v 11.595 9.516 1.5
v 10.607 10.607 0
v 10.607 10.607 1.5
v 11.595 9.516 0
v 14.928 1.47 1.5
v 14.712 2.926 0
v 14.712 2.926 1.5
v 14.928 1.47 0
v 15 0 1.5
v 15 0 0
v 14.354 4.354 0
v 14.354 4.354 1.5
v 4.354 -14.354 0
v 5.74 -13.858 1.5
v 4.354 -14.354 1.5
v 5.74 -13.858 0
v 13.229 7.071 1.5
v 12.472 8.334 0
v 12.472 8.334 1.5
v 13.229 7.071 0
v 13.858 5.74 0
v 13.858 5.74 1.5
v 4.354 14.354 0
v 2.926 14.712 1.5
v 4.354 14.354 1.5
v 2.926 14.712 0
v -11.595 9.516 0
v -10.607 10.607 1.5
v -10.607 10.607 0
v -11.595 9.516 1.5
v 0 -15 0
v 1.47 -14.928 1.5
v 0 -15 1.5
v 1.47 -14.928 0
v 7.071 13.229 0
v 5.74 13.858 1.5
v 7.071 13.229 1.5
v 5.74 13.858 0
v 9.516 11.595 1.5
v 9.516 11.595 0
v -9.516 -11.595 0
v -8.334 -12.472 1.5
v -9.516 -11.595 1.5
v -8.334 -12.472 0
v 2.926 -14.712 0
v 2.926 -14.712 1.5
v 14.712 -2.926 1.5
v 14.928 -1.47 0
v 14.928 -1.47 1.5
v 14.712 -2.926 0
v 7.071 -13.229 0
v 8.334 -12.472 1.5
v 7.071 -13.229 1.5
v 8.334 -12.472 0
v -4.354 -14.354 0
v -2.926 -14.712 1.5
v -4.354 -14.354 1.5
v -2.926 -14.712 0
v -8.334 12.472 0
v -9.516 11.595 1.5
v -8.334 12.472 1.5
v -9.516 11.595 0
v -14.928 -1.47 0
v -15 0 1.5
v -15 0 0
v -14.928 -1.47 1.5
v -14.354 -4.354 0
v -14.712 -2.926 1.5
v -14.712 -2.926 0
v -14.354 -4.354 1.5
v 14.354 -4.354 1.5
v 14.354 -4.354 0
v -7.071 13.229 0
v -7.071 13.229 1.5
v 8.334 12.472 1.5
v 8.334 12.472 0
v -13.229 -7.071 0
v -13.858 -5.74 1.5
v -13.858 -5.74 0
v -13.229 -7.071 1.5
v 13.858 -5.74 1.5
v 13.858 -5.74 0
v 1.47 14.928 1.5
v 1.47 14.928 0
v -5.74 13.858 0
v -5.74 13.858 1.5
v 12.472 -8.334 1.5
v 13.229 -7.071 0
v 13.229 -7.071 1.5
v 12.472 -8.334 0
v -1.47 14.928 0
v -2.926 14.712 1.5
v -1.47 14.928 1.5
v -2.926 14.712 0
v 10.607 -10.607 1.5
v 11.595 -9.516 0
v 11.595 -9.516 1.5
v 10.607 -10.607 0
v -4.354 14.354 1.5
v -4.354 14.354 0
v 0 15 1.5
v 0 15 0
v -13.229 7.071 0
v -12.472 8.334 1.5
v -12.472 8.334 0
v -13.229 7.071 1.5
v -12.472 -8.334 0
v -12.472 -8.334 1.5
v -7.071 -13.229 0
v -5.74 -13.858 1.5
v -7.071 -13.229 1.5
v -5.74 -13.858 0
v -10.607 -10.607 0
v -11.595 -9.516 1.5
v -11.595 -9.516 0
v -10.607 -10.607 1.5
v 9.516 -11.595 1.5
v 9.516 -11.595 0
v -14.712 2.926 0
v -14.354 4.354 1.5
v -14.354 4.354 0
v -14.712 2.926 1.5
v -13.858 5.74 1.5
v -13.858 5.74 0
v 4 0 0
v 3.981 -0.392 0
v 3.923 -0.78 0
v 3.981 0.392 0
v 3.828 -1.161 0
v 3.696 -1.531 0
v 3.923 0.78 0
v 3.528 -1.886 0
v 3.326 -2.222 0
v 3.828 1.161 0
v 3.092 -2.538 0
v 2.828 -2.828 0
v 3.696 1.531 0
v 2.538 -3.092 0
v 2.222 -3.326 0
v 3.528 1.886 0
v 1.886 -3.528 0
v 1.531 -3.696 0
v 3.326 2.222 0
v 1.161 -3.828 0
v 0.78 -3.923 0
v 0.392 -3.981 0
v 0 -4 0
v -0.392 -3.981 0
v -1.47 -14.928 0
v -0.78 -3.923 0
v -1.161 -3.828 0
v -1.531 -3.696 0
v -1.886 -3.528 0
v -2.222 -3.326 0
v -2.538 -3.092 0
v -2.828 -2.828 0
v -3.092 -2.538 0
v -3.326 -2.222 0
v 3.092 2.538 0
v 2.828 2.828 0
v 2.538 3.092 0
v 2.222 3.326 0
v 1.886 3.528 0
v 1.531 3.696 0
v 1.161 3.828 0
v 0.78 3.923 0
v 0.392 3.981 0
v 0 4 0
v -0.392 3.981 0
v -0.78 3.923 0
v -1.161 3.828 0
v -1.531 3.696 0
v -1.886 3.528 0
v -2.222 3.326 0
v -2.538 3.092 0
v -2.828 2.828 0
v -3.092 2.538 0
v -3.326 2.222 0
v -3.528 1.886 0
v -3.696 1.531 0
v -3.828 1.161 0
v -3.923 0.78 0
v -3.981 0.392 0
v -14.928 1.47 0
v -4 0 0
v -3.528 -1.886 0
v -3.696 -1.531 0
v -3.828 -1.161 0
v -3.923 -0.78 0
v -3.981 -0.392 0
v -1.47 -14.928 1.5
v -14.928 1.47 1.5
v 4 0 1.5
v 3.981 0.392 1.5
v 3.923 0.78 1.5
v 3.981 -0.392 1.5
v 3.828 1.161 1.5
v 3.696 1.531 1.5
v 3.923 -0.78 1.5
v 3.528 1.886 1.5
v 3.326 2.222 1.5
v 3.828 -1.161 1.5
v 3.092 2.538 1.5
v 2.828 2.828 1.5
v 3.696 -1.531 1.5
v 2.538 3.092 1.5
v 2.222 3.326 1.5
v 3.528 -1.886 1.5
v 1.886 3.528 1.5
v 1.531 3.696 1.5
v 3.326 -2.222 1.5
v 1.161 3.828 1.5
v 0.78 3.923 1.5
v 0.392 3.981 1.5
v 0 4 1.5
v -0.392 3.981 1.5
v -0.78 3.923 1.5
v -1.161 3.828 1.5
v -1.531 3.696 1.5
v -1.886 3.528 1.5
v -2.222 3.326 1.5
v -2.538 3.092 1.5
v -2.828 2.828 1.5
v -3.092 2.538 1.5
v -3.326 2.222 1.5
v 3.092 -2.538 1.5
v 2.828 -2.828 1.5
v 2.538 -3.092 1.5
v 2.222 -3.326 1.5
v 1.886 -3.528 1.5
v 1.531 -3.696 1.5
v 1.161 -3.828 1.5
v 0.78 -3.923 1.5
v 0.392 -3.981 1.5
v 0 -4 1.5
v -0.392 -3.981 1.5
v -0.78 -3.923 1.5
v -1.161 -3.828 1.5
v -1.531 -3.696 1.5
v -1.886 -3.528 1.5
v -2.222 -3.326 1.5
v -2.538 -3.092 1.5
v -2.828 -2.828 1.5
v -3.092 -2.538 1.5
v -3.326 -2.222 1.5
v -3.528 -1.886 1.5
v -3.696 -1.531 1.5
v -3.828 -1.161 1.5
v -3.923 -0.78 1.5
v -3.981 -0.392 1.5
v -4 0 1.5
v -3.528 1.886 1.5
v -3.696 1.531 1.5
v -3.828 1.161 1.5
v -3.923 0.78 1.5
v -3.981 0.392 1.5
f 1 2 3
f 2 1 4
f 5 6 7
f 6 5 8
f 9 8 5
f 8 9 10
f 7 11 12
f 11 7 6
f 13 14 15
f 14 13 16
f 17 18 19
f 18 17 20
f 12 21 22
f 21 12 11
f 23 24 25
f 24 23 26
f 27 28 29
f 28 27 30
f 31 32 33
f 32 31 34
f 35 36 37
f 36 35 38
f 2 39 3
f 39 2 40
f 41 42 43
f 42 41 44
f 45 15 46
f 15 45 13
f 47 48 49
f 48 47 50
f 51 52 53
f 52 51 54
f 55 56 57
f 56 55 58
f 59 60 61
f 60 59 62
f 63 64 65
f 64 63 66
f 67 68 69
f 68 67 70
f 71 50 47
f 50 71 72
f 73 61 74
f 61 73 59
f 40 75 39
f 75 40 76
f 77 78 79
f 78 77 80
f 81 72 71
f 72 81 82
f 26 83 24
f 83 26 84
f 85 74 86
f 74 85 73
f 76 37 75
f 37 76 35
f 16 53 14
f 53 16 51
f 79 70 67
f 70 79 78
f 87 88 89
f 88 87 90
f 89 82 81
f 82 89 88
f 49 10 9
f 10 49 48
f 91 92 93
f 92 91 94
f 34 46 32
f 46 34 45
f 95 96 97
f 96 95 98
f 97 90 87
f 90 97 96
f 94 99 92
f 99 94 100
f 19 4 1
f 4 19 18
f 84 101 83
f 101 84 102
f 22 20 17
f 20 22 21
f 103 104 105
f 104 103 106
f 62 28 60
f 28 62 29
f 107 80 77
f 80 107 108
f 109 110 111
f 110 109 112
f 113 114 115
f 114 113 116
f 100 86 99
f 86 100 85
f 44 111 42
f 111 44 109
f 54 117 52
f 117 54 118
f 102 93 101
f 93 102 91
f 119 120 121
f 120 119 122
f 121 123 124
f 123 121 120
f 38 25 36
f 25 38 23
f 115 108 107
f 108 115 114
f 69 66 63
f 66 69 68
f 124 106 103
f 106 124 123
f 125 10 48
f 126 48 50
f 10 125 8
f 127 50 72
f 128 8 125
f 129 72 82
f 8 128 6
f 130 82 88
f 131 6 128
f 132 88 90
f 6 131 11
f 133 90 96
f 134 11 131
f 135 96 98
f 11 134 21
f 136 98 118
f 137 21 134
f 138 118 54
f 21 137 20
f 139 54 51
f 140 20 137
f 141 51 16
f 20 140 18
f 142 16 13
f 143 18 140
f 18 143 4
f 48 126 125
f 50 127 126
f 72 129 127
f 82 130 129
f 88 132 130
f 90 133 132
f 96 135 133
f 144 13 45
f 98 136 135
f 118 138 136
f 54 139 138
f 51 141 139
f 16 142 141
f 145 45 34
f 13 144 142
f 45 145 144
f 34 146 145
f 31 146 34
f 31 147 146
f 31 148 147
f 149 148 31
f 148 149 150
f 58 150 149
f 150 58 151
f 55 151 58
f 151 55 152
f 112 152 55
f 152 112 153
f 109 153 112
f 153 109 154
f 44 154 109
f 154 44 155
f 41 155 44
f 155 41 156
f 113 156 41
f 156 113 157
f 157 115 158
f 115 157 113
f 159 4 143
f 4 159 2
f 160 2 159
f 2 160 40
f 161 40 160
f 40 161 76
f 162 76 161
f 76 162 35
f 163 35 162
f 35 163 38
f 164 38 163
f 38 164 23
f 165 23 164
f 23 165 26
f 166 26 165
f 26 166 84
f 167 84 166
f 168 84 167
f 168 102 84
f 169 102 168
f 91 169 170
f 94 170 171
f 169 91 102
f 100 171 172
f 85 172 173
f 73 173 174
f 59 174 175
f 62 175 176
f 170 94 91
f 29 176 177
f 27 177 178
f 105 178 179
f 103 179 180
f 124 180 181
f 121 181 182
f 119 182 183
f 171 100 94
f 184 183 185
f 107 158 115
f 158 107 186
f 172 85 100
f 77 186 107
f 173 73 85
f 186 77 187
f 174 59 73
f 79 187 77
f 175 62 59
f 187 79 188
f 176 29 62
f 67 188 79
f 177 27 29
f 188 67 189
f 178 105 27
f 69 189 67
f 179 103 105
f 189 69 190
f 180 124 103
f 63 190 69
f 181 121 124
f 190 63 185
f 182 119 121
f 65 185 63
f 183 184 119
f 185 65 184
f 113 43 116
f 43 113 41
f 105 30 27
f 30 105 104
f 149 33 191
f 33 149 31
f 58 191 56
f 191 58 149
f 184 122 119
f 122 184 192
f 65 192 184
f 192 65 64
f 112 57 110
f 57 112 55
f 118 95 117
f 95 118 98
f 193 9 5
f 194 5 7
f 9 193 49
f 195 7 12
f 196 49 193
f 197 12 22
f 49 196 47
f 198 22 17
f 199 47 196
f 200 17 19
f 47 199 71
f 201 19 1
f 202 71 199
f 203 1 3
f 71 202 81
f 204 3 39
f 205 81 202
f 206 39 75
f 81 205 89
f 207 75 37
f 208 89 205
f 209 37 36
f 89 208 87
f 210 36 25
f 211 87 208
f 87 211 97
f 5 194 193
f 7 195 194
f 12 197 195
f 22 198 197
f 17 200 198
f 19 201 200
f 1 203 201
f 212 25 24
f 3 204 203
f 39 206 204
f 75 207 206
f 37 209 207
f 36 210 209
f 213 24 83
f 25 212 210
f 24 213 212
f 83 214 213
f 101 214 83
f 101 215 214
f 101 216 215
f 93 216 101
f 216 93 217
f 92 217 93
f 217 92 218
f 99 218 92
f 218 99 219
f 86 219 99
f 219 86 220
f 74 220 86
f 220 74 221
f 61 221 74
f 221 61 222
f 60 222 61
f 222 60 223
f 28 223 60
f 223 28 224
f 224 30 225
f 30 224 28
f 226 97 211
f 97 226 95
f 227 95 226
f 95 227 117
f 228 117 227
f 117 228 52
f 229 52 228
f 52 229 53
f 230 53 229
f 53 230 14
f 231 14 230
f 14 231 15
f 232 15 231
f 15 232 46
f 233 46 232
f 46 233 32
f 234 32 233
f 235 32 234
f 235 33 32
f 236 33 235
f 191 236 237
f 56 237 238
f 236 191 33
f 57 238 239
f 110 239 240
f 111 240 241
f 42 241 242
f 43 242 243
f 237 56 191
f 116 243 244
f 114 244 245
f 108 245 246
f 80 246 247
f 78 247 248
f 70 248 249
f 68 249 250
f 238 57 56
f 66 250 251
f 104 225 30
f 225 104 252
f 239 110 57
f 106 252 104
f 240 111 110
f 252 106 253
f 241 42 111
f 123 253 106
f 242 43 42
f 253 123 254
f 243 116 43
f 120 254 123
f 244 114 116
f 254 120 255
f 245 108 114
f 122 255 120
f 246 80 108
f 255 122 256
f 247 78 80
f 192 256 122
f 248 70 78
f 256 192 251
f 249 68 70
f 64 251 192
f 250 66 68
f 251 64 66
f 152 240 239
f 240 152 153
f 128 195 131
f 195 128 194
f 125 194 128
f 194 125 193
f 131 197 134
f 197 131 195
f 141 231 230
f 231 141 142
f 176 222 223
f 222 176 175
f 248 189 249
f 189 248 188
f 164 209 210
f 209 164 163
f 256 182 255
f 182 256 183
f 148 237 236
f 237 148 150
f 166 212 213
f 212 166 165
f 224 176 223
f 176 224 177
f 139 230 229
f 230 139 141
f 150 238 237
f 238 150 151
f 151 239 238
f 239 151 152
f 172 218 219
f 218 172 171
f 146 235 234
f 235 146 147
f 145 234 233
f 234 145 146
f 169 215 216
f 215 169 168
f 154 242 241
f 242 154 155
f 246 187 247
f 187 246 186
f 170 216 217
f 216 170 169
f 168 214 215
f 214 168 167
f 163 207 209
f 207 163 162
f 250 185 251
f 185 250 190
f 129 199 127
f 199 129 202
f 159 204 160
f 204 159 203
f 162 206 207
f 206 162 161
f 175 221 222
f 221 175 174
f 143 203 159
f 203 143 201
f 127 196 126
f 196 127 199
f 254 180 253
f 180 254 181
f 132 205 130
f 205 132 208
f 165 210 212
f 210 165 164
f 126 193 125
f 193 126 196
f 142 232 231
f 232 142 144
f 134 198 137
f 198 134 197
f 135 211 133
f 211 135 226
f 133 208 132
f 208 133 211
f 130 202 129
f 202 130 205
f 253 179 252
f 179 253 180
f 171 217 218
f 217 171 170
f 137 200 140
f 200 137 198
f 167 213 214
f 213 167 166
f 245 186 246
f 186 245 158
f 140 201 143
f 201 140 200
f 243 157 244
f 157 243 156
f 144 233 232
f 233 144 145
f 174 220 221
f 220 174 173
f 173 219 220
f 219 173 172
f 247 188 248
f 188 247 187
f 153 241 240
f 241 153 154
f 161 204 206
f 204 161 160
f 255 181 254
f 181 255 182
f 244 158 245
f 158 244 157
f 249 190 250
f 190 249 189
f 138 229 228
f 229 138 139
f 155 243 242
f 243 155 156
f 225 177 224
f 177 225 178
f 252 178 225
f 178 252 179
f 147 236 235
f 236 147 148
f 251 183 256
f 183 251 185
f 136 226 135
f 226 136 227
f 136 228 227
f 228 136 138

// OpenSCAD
difference() {
    cylinder(h=1.5, d=30.0, $fn=64);
    translate([0, 0, -0.1])
        cylinder(h=1.7, d=8.0, $fn=64);
}
